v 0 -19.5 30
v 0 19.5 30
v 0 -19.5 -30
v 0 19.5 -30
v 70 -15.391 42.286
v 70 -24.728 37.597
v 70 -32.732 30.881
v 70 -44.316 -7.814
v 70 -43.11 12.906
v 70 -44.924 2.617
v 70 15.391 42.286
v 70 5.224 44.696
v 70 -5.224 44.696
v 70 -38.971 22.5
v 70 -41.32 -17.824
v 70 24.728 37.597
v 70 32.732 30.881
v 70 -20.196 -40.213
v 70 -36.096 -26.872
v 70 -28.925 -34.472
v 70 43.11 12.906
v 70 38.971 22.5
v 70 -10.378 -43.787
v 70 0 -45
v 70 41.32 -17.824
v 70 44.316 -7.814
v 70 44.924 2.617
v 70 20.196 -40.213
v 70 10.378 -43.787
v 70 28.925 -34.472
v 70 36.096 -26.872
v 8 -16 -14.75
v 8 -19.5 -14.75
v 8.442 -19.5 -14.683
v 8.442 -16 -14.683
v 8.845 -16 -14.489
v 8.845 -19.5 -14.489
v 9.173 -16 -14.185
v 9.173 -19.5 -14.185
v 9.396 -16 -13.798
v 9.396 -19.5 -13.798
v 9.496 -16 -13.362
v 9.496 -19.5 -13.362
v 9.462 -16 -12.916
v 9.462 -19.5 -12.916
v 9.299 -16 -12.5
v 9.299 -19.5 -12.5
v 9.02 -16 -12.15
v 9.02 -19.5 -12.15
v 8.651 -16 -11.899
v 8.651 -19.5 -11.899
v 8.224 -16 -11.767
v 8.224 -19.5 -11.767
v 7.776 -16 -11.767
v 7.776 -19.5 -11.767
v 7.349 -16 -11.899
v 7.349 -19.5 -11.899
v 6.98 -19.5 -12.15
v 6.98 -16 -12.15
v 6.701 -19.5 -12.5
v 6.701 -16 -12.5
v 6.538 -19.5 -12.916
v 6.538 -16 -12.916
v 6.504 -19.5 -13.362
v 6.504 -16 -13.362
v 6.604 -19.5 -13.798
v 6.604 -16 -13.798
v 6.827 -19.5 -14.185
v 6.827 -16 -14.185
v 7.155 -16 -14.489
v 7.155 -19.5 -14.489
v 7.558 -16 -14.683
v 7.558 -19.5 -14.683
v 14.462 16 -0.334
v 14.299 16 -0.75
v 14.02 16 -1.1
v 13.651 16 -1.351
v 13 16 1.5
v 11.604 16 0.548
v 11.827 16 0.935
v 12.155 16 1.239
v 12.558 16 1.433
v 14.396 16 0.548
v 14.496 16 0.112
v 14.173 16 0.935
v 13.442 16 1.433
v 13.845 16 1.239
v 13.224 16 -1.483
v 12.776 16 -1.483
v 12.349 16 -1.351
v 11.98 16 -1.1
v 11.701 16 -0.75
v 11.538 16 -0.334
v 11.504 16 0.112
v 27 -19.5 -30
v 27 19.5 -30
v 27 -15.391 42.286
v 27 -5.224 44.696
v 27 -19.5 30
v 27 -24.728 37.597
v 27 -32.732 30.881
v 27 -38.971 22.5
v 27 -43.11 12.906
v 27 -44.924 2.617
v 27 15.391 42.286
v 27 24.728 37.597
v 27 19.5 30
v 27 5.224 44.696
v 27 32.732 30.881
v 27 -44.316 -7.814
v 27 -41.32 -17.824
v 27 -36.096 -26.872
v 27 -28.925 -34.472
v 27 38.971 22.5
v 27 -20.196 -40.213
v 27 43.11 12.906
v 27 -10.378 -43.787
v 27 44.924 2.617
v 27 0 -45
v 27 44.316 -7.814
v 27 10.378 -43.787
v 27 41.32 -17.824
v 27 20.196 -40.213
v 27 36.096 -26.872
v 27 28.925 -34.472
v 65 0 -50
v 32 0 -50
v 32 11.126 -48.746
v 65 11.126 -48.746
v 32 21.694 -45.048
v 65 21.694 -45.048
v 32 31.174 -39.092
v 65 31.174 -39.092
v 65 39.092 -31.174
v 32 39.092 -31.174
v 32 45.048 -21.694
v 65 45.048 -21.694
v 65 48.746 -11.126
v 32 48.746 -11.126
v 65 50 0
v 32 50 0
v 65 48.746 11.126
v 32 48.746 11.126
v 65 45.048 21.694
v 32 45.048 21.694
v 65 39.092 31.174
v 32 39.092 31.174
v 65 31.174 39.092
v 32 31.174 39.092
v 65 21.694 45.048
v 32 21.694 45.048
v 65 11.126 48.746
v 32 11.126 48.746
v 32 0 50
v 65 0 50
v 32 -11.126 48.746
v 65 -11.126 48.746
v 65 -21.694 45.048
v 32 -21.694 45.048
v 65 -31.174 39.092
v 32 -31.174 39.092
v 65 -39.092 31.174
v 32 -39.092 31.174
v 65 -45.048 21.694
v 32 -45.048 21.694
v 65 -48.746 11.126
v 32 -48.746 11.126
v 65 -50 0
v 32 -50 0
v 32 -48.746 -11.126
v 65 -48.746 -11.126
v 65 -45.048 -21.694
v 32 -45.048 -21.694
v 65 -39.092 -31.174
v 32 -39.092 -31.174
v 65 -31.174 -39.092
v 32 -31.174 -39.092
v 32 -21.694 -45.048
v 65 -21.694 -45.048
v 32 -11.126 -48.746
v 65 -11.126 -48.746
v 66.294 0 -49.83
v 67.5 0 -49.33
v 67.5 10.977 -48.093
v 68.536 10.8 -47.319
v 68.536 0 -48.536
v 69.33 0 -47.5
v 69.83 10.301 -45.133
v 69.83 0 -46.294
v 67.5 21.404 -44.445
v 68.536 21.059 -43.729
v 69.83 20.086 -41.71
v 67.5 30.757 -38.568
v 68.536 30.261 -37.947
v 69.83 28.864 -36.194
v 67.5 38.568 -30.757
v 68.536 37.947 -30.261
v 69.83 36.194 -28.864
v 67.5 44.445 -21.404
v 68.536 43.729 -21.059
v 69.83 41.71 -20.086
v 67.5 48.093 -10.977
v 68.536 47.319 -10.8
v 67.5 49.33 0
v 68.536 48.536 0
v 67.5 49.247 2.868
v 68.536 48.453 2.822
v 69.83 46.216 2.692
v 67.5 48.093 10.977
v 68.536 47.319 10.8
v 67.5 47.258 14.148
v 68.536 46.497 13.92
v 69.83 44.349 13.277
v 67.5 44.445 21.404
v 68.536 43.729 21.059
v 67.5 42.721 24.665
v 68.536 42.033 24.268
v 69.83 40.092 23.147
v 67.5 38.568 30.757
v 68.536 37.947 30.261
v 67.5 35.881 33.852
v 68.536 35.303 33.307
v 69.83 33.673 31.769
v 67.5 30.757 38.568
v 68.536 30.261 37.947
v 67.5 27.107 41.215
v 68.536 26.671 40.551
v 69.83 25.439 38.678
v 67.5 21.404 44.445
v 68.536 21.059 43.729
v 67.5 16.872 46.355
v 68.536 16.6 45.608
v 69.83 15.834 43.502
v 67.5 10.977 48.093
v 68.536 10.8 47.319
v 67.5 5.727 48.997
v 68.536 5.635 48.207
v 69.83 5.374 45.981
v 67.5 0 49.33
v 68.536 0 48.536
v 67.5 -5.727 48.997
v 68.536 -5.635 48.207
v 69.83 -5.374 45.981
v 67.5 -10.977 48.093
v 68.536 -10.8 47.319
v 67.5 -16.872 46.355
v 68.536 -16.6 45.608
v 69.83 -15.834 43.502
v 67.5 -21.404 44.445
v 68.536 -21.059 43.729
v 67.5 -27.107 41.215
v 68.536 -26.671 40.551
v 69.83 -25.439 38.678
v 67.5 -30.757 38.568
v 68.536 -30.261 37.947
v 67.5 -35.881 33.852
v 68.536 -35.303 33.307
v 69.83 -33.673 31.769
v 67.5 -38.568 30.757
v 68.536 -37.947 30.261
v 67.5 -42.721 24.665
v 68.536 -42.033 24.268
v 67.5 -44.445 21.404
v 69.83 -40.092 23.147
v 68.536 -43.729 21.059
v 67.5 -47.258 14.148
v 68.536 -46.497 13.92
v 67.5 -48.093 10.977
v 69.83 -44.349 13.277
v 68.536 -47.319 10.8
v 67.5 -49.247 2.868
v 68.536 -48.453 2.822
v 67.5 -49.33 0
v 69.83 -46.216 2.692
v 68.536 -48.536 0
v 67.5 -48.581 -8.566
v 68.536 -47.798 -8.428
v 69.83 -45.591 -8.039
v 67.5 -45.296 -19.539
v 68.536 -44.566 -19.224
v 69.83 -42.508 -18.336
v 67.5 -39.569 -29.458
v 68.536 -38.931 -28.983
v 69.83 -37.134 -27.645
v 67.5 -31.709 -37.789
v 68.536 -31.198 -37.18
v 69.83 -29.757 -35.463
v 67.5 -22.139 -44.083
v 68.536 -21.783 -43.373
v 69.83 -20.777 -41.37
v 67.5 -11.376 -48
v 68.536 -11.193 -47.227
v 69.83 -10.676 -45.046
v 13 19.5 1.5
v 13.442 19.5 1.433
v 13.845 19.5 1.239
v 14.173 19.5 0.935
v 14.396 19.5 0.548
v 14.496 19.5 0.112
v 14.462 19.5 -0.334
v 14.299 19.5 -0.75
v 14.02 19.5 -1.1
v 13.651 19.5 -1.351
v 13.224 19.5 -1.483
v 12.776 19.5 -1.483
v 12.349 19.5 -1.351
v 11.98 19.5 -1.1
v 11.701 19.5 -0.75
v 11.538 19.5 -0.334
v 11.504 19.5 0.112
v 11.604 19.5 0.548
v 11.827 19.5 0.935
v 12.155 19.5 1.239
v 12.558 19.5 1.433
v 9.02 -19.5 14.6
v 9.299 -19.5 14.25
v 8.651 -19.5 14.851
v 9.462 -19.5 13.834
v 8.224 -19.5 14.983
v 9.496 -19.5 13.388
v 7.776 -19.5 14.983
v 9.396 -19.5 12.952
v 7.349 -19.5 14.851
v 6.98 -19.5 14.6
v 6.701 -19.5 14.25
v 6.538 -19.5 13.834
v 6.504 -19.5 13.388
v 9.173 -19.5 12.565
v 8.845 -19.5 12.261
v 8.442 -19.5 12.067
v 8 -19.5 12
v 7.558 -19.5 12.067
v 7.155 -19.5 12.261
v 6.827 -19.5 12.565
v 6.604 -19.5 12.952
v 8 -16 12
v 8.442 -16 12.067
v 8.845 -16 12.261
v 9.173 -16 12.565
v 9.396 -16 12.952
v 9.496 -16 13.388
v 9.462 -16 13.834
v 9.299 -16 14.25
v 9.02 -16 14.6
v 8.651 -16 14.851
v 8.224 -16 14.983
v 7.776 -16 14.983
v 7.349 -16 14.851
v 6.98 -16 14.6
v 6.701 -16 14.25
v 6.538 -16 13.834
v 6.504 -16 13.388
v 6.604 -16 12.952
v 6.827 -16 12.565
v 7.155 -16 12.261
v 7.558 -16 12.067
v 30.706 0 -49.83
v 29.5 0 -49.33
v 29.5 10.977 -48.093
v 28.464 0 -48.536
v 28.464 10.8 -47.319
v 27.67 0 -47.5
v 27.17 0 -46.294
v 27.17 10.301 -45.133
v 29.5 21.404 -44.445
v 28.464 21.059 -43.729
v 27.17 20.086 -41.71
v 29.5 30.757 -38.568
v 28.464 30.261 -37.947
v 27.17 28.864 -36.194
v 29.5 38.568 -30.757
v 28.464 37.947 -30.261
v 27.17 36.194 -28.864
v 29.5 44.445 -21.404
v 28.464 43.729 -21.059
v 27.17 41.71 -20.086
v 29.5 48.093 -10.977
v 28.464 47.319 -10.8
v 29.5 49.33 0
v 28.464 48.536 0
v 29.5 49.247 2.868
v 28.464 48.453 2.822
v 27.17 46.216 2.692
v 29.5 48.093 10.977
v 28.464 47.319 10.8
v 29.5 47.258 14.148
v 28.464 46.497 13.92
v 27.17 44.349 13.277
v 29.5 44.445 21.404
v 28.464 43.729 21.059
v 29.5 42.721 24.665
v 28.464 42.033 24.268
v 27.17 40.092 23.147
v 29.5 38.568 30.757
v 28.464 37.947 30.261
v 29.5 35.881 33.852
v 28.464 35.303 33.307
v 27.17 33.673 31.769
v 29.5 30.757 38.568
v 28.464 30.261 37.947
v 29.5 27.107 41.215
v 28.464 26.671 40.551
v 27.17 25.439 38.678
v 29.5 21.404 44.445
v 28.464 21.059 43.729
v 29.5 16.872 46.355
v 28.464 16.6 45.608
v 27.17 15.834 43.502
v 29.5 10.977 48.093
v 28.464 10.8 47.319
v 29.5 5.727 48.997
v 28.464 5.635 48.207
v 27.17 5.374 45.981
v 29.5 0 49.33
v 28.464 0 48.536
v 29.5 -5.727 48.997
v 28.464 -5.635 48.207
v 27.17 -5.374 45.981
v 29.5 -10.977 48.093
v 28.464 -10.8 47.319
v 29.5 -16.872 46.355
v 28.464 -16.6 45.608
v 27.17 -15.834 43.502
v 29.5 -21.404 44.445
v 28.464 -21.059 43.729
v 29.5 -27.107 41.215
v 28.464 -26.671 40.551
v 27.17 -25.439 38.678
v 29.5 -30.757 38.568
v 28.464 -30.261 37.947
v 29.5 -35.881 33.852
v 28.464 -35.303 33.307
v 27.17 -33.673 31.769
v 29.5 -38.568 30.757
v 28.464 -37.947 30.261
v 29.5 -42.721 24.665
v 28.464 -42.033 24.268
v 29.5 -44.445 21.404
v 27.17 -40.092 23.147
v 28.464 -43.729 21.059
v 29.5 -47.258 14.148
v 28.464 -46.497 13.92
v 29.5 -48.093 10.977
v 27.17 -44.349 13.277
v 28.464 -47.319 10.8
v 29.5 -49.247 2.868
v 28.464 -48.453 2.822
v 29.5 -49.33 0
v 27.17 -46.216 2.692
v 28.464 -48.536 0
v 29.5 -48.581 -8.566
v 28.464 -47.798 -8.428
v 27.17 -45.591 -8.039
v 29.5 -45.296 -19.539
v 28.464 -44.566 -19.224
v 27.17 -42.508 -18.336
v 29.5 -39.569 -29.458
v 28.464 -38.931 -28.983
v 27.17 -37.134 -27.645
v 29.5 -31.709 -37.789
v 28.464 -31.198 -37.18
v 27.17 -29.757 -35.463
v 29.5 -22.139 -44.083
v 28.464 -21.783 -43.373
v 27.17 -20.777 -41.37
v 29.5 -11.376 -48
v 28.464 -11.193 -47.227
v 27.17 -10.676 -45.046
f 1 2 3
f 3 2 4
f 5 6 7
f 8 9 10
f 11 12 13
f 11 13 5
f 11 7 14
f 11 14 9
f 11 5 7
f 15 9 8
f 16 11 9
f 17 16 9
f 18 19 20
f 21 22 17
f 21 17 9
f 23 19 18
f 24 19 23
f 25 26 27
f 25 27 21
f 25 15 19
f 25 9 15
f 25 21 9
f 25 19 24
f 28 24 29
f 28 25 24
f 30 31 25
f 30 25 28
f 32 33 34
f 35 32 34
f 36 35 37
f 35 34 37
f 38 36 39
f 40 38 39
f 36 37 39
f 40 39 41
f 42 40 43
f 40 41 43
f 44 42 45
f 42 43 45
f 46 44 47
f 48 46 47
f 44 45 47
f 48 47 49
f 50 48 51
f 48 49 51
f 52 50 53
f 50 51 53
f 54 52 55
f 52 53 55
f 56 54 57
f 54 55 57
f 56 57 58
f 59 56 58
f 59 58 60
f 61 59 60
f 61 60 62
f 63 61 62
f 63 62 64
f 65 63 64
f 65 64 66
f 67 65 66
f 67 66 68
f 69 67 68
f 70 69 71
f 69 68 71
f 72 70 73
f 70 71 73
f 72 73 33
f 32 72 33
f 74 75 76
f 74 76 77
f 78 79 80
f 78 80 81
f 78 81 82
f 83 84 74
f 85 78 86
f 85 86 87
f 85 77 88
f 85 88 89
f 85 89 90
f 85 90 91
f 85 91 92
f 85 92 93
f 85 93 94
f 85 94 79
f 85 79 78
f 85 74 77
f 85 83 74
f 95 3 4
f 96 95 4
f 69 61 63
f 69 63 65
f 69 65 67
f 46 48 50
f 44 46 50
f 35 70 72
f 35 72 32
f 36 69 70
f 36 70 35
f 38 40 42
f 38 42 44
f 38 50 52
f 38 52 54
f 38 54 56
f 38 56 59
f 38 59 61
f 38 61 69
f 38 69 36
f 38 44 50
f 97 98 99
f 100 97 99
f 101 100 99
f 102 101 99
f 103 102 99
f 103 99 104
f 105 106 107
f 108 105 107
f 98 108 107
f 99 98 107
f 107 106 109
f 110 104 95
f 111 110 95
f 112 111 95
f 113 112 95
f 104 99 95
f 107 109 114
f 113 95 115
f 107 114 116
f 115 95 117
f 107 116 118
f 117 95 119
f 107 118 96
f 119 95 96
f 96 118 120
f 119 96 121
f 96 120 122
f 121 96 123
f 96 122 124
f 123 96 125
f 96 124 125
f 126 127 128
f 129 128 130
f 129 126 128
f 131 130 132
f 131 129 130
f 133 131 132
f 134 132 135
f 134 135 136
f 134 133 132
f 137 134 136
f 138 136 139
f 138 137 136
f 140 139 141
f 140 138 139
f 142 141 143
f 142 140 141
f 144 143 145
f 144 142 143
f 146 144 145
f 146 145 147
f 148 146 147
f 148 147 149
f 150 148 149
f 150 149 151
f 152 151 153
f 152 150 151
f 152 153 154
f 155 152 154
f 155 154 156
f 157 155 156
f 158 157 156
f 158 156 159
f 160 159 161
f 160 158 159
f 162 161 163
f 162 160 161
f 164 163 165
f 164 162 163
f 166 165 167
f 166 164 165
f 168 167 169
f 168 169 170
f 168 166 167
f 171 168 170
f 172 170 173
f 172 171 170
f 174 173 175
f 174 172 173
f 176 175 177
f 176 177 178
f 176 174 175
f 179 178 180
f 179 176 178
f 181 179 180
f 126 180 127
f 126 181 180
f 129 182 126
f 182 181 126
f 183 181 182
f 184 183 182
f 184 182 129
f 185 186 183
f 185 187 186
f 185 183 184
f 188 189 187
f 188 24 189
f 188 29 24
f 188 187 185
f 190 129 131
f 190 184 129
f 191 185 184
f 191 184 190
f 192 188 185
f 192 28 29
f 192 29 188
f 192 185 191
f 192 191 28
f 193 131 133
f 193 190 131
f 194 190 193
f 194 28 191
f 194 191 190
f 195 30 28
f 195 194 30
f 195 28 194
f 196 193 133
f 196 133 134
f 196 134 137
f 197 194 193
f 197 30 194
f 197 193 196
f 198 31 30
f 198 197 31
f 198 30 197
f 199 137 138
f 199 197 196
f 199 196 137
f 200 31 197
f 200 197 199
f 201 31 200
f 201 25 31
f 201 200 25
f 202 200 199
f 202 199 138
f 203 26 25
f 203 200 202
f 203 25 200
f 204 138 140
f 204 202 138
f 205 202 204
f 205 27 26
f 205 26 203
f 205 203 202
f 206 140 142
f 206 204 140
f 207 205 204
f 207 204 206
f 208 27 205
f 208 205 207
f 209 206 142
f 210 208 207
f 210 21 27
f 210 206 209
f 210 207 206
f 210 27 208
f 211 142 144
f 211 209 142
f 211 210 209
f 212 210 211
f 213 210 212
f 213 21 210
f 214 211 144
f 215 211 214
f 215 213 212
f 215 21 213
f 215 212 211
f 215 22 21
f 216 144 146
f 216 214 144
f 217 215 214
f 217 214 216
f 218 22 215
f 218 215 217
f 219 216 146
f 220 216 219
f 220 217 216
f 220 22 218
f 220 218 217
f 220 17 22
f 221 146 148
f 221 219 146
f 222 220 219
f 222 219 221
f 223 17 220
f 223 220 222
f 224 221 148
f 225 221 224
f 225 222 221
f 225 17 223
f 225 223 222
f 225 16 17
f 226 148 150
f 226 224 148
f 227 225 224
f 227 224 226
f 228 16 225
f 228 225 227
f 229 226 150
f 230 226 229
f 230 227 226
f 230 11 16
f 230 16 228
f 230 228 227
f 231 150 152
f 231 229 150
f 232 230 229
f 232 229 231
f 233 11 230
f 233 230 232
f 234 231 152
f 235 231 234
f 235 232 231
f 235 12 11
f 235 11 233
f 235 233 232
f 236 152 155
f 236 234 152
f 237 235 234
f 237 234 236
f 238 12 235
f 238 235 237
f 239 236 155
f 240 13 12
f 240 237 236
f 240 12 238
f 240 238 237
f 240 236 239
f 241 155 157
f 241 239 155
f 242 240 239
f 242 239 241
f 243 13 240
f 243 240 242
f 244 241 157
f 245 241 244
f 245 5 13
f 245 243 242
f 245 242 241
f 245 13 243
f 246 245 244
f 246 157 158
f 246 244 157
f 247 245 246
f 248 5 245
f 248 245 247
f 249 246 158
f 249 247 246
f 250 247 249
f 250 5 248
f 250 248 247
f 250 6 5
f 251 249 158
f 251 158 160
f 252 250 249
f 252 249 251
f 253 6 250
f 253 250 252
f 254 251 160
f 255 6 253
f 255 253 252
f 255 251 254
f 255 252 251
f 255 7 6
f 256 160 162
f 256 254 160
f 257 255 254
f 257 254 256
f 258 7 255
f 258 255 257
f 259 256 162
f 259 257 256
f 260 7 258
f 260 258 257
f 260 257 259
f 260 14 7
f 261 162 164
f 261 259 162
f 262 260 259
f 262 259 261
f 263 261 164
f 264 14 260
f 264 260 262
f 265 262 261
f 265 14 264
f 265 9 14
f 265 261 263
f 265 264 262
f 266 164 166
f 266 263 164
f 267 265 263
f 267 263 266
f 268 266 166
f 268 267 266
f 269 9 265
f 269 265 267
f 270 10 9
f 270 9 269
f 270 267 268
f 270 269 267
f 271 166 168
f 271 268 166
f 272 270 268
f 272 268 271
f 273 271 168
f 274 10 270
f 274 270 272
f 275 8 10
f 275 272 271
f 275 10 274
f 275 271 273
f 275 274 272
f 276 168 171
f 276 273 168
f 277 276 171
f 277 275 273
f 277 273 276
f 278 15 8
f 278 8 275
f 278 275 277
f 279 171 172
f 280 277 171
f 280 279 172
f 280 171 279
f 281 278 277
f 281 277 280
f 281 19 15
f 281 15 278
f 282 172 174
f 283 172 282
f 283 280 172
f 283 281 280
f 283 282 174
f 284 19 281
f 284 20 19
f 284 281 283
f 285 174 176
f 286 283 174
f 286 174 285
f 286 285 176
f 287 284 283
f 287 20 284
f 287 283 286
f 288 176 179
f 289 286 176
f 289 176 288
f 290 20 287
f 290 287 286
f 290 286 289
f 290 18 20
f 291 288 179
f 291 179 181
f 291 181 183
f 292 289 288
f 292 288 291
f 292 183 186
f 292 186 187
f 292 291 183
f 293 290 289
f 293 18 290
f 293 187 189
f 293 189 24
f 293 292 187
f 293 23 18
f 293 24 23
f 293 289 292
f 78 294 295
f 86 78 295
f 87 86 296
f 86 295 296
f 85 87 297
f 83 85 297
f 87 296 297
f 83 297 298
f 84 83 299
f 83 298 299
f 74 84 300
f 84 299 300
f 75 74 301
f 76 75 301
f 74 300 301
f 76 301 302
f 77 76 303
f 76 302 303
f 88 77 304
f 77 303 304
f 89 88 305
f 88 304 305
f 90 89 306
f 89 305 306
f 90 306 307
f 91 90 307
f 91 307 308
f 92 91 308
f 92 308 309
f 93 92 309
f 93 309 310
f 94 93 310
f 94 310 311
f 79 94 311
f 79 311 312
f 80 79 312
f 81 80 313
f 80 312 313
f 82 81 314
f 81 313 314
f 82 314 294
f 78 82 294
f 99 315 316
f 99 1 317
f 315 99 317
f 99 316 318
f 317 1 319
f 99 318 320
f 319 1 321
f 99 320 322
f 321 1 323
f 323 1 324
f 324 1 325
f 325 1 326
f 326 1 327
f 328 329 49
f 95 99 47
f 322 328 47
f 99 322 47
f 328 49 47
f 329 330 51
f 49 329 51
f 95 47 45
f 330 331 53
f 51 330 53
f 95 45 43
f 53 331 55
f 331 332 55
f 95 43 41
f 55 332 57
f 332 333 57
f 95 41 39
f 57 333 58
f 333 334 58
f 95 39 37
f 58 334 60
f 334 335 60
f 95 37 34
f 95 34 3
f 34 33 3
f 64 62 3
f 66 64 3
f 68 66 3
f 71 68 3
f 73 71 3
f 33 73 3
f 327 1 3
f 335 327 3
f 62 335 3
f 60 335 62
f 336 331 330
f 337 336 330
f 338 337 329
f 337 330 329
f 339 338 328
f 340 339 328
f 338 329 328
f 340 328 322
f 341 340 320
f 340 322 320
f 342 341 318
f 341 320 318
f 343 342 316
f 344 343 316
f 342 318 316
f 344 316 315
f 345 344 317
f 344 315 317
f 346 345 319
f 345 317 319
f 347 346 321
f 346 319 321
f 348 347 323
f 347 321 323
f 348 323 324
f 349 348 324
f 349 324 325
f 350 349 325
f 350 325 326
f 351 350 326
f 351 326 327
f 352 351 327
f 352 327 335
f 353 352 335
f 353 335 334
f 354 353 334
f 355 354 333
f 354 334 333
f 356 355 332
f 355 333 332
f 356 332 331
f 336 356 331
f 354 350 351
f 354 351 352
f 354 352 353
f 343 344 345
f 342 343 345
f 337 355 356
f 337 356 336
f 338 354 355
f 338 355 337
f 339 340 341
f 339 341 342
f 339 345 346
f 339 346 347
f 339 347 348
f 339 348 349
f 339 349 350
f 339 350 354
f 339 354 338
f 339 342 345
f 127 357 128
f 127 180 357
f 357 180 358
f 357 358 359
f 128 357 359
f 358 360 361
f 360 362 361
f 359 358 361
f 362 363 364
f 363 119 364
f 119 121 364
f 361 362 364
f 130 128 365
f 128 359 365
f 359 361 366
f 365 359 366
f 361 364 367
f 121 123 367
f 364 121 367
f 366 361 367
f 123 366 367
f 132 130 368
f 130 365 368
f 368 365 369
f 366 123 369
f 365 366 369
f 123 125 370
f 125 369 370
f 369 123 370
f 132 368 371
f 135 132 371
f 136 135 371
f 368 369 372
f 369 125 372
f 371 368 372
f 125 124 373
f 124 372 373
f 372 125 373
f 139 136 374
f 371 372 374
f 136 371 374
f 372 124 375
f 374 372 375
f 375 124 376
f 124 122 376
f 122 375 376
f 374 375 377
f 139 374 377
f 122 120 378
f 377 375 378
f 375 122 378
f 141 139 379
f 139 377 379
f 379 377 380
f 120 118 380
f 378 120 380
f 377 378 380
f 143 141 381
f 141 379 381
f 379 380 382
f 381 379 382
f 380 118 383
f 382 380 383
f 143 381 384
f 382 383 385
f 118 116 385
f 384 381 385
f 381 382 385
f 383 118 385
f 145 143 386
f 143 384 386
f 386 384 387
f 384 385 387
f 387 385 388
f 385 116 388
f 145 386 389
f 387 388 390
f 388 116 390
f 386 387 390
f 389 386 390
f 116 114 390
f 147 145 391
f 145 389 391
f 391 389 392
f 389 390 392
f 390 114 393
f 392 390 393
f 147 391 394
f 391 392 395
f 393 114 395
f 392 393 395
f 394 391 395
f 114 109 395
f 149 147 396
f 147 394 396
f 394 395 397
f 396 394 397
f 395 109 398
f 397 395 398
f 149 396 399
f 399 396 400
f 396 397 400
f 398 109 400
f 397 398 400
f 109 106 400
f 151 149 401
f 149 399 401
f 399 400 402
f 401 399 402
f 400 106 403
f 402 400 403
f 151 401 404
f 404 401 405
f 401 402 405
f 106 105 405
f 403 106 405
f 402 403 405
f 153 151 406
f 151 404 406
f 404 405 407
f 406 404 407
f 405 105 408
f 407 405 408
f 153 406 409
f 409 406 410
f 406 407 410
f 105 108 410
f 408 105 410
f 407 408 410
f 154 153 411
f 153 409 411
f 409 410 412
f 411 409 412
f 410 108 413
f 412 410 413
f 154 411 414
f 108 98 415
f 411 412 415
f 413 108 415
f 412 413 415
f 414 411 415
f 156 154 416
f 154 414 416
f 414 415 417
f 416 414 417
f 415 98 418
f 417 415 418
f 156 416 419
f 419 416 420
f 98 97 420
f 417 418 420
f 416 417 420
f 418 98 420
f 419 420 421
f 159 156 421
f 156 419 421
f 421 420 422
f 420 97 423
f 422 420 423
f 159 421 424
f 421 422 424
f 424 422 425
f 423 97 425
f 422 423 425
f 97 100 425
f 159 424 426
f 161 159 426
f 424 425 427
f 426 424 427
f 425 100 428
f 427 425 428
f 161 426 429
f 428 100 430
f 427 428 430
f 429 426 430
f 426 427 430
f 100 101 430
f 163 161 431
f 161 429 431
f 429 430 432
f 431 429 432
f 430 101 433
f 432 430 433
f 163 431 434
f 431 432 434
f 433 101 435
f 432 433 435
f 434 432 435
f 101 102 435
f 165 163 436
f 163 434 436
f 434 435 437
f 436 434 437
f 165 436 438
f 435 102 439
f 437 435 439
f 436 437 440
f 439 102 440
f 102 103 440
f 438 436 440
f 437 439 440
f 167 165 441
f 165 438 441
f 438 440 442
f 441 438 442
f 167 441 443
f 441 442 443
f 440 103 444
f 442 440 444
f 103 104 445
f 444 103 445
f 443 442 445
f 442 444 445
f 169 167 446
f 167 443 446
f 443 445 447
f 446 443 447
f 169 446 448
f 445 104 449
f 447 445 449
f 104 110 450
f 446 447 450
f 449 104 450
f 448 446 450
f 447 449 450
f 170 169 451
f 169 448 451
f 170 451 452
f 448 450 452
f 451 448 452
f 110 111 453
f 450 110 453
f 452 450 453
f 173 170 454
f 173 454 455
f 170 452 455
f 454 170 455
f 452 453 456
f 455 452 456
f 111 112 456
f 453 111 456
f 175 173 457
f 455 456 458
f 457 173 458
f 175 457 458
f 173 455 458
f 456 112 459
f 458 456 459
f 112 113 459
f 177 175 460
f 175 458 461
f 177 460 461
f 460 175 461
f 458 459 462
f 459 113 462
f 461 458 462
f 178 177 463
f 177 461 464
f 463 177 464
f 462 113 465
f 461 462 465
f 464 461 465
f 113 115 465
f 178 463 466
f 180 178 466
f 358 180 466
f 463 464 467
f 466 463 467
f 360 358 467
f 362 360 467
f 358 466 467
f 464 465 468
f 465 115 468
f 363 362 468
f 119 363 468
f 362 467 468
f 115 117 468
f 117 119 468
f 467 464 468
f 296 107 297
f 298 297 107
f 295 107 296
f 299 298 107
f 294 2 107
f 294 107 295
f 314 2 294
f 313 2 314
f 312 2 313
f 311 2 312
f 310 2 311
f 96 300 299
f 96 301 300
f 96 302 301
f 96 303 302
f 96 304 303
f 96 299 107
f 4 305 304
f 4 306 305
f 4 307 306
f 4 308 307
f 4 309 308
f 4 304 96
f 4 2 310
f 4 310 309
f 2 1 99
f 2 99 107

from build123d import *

# Parameters (mm, degrees)
SKETCH_2_W          = 60
SKETCH_2_H          = 39
EXTRUDE_1_DEPTH     = 70
SKETCH_3_R          = 50
EXTRUDE_2_DEPTH     = 43
FILLET_1_R          = 5
FILLET_2_R          = 5
SKETCH_4_R          = 1.5
CUT_EXTRUDE_1_DEPTH = 3.5
SKETCH_5_R          = 1.5
CUT_EXTRUDE_2_DEPTH = 3.5


with BuildPart() as part:
    # 草图2 → 凸台-拉伸1 (new body)
    with BuildSketch(Plane(origin=(0, 0, 0), x_dir=(0, 0, -1), z_dir=(1, 0, 0))):
        Rectangle(SKETCH_2_W, SKETCH_2_H)
    extrude(amount=EXTRUDE_1_DEPTH)

    # 草图3 → 凸台-拉伸2 (add)
    with BuildSketch(Plane(origin=(70, 0, 0), x_dir=(0, 0, -1), z_dir=(1, 0, 0))):
        Circle(SKETCH_3_R)
    extrude(amount=-EXTRUDE_2_DEPTH)

    # 圆角1
    fillet_1_edges = [part.edges().sort_by_distance(p)[0] for p in [
        (70, 0, 50),
    ]]
    fillet(fillet_1_edges, radius=FILLET_1_R)

    # 圆角2
    fillet_2_edges = [part.edges().sort_by_distance(p)[0] for p in [
        (27, 0, 50),
    ]]
    fillet(fillet_2_edges, radius=FILLET_2_R)

    # 草图4 → 切除-拉伸1 (cut)
    with BuildSketch(Plane(origin=(0, 19.5, 0), x_dir=(1, 0, 0), z_dir=(0, 1, 0))):
        with Locations(Location((13, 0, 0), (0, 0, 270))):
            Circle(SKETCH_4_R)
    extrude(amount=-CUT_EXTRUDE_1_DEPTH, mode=Mode.SUBTRACT)

    # 草图5 → 切除-拉伸2 (cut)
    with BuildSketch(Plane.XZ.offset(19.5)):
        with Locations(Location((8, 13.5, 0), (0, 0, 270))):
            Circle(SKETCH_5_R)
        with Locations(Location((8, -13.25, 0), (0, 0, 270))):
            Circle(SKETCH_5_R)
    extrude(amount=-CUT_EXTRUDE_2_DEPTH, mode=Mode.SUBTRACT)


solid = part.part
